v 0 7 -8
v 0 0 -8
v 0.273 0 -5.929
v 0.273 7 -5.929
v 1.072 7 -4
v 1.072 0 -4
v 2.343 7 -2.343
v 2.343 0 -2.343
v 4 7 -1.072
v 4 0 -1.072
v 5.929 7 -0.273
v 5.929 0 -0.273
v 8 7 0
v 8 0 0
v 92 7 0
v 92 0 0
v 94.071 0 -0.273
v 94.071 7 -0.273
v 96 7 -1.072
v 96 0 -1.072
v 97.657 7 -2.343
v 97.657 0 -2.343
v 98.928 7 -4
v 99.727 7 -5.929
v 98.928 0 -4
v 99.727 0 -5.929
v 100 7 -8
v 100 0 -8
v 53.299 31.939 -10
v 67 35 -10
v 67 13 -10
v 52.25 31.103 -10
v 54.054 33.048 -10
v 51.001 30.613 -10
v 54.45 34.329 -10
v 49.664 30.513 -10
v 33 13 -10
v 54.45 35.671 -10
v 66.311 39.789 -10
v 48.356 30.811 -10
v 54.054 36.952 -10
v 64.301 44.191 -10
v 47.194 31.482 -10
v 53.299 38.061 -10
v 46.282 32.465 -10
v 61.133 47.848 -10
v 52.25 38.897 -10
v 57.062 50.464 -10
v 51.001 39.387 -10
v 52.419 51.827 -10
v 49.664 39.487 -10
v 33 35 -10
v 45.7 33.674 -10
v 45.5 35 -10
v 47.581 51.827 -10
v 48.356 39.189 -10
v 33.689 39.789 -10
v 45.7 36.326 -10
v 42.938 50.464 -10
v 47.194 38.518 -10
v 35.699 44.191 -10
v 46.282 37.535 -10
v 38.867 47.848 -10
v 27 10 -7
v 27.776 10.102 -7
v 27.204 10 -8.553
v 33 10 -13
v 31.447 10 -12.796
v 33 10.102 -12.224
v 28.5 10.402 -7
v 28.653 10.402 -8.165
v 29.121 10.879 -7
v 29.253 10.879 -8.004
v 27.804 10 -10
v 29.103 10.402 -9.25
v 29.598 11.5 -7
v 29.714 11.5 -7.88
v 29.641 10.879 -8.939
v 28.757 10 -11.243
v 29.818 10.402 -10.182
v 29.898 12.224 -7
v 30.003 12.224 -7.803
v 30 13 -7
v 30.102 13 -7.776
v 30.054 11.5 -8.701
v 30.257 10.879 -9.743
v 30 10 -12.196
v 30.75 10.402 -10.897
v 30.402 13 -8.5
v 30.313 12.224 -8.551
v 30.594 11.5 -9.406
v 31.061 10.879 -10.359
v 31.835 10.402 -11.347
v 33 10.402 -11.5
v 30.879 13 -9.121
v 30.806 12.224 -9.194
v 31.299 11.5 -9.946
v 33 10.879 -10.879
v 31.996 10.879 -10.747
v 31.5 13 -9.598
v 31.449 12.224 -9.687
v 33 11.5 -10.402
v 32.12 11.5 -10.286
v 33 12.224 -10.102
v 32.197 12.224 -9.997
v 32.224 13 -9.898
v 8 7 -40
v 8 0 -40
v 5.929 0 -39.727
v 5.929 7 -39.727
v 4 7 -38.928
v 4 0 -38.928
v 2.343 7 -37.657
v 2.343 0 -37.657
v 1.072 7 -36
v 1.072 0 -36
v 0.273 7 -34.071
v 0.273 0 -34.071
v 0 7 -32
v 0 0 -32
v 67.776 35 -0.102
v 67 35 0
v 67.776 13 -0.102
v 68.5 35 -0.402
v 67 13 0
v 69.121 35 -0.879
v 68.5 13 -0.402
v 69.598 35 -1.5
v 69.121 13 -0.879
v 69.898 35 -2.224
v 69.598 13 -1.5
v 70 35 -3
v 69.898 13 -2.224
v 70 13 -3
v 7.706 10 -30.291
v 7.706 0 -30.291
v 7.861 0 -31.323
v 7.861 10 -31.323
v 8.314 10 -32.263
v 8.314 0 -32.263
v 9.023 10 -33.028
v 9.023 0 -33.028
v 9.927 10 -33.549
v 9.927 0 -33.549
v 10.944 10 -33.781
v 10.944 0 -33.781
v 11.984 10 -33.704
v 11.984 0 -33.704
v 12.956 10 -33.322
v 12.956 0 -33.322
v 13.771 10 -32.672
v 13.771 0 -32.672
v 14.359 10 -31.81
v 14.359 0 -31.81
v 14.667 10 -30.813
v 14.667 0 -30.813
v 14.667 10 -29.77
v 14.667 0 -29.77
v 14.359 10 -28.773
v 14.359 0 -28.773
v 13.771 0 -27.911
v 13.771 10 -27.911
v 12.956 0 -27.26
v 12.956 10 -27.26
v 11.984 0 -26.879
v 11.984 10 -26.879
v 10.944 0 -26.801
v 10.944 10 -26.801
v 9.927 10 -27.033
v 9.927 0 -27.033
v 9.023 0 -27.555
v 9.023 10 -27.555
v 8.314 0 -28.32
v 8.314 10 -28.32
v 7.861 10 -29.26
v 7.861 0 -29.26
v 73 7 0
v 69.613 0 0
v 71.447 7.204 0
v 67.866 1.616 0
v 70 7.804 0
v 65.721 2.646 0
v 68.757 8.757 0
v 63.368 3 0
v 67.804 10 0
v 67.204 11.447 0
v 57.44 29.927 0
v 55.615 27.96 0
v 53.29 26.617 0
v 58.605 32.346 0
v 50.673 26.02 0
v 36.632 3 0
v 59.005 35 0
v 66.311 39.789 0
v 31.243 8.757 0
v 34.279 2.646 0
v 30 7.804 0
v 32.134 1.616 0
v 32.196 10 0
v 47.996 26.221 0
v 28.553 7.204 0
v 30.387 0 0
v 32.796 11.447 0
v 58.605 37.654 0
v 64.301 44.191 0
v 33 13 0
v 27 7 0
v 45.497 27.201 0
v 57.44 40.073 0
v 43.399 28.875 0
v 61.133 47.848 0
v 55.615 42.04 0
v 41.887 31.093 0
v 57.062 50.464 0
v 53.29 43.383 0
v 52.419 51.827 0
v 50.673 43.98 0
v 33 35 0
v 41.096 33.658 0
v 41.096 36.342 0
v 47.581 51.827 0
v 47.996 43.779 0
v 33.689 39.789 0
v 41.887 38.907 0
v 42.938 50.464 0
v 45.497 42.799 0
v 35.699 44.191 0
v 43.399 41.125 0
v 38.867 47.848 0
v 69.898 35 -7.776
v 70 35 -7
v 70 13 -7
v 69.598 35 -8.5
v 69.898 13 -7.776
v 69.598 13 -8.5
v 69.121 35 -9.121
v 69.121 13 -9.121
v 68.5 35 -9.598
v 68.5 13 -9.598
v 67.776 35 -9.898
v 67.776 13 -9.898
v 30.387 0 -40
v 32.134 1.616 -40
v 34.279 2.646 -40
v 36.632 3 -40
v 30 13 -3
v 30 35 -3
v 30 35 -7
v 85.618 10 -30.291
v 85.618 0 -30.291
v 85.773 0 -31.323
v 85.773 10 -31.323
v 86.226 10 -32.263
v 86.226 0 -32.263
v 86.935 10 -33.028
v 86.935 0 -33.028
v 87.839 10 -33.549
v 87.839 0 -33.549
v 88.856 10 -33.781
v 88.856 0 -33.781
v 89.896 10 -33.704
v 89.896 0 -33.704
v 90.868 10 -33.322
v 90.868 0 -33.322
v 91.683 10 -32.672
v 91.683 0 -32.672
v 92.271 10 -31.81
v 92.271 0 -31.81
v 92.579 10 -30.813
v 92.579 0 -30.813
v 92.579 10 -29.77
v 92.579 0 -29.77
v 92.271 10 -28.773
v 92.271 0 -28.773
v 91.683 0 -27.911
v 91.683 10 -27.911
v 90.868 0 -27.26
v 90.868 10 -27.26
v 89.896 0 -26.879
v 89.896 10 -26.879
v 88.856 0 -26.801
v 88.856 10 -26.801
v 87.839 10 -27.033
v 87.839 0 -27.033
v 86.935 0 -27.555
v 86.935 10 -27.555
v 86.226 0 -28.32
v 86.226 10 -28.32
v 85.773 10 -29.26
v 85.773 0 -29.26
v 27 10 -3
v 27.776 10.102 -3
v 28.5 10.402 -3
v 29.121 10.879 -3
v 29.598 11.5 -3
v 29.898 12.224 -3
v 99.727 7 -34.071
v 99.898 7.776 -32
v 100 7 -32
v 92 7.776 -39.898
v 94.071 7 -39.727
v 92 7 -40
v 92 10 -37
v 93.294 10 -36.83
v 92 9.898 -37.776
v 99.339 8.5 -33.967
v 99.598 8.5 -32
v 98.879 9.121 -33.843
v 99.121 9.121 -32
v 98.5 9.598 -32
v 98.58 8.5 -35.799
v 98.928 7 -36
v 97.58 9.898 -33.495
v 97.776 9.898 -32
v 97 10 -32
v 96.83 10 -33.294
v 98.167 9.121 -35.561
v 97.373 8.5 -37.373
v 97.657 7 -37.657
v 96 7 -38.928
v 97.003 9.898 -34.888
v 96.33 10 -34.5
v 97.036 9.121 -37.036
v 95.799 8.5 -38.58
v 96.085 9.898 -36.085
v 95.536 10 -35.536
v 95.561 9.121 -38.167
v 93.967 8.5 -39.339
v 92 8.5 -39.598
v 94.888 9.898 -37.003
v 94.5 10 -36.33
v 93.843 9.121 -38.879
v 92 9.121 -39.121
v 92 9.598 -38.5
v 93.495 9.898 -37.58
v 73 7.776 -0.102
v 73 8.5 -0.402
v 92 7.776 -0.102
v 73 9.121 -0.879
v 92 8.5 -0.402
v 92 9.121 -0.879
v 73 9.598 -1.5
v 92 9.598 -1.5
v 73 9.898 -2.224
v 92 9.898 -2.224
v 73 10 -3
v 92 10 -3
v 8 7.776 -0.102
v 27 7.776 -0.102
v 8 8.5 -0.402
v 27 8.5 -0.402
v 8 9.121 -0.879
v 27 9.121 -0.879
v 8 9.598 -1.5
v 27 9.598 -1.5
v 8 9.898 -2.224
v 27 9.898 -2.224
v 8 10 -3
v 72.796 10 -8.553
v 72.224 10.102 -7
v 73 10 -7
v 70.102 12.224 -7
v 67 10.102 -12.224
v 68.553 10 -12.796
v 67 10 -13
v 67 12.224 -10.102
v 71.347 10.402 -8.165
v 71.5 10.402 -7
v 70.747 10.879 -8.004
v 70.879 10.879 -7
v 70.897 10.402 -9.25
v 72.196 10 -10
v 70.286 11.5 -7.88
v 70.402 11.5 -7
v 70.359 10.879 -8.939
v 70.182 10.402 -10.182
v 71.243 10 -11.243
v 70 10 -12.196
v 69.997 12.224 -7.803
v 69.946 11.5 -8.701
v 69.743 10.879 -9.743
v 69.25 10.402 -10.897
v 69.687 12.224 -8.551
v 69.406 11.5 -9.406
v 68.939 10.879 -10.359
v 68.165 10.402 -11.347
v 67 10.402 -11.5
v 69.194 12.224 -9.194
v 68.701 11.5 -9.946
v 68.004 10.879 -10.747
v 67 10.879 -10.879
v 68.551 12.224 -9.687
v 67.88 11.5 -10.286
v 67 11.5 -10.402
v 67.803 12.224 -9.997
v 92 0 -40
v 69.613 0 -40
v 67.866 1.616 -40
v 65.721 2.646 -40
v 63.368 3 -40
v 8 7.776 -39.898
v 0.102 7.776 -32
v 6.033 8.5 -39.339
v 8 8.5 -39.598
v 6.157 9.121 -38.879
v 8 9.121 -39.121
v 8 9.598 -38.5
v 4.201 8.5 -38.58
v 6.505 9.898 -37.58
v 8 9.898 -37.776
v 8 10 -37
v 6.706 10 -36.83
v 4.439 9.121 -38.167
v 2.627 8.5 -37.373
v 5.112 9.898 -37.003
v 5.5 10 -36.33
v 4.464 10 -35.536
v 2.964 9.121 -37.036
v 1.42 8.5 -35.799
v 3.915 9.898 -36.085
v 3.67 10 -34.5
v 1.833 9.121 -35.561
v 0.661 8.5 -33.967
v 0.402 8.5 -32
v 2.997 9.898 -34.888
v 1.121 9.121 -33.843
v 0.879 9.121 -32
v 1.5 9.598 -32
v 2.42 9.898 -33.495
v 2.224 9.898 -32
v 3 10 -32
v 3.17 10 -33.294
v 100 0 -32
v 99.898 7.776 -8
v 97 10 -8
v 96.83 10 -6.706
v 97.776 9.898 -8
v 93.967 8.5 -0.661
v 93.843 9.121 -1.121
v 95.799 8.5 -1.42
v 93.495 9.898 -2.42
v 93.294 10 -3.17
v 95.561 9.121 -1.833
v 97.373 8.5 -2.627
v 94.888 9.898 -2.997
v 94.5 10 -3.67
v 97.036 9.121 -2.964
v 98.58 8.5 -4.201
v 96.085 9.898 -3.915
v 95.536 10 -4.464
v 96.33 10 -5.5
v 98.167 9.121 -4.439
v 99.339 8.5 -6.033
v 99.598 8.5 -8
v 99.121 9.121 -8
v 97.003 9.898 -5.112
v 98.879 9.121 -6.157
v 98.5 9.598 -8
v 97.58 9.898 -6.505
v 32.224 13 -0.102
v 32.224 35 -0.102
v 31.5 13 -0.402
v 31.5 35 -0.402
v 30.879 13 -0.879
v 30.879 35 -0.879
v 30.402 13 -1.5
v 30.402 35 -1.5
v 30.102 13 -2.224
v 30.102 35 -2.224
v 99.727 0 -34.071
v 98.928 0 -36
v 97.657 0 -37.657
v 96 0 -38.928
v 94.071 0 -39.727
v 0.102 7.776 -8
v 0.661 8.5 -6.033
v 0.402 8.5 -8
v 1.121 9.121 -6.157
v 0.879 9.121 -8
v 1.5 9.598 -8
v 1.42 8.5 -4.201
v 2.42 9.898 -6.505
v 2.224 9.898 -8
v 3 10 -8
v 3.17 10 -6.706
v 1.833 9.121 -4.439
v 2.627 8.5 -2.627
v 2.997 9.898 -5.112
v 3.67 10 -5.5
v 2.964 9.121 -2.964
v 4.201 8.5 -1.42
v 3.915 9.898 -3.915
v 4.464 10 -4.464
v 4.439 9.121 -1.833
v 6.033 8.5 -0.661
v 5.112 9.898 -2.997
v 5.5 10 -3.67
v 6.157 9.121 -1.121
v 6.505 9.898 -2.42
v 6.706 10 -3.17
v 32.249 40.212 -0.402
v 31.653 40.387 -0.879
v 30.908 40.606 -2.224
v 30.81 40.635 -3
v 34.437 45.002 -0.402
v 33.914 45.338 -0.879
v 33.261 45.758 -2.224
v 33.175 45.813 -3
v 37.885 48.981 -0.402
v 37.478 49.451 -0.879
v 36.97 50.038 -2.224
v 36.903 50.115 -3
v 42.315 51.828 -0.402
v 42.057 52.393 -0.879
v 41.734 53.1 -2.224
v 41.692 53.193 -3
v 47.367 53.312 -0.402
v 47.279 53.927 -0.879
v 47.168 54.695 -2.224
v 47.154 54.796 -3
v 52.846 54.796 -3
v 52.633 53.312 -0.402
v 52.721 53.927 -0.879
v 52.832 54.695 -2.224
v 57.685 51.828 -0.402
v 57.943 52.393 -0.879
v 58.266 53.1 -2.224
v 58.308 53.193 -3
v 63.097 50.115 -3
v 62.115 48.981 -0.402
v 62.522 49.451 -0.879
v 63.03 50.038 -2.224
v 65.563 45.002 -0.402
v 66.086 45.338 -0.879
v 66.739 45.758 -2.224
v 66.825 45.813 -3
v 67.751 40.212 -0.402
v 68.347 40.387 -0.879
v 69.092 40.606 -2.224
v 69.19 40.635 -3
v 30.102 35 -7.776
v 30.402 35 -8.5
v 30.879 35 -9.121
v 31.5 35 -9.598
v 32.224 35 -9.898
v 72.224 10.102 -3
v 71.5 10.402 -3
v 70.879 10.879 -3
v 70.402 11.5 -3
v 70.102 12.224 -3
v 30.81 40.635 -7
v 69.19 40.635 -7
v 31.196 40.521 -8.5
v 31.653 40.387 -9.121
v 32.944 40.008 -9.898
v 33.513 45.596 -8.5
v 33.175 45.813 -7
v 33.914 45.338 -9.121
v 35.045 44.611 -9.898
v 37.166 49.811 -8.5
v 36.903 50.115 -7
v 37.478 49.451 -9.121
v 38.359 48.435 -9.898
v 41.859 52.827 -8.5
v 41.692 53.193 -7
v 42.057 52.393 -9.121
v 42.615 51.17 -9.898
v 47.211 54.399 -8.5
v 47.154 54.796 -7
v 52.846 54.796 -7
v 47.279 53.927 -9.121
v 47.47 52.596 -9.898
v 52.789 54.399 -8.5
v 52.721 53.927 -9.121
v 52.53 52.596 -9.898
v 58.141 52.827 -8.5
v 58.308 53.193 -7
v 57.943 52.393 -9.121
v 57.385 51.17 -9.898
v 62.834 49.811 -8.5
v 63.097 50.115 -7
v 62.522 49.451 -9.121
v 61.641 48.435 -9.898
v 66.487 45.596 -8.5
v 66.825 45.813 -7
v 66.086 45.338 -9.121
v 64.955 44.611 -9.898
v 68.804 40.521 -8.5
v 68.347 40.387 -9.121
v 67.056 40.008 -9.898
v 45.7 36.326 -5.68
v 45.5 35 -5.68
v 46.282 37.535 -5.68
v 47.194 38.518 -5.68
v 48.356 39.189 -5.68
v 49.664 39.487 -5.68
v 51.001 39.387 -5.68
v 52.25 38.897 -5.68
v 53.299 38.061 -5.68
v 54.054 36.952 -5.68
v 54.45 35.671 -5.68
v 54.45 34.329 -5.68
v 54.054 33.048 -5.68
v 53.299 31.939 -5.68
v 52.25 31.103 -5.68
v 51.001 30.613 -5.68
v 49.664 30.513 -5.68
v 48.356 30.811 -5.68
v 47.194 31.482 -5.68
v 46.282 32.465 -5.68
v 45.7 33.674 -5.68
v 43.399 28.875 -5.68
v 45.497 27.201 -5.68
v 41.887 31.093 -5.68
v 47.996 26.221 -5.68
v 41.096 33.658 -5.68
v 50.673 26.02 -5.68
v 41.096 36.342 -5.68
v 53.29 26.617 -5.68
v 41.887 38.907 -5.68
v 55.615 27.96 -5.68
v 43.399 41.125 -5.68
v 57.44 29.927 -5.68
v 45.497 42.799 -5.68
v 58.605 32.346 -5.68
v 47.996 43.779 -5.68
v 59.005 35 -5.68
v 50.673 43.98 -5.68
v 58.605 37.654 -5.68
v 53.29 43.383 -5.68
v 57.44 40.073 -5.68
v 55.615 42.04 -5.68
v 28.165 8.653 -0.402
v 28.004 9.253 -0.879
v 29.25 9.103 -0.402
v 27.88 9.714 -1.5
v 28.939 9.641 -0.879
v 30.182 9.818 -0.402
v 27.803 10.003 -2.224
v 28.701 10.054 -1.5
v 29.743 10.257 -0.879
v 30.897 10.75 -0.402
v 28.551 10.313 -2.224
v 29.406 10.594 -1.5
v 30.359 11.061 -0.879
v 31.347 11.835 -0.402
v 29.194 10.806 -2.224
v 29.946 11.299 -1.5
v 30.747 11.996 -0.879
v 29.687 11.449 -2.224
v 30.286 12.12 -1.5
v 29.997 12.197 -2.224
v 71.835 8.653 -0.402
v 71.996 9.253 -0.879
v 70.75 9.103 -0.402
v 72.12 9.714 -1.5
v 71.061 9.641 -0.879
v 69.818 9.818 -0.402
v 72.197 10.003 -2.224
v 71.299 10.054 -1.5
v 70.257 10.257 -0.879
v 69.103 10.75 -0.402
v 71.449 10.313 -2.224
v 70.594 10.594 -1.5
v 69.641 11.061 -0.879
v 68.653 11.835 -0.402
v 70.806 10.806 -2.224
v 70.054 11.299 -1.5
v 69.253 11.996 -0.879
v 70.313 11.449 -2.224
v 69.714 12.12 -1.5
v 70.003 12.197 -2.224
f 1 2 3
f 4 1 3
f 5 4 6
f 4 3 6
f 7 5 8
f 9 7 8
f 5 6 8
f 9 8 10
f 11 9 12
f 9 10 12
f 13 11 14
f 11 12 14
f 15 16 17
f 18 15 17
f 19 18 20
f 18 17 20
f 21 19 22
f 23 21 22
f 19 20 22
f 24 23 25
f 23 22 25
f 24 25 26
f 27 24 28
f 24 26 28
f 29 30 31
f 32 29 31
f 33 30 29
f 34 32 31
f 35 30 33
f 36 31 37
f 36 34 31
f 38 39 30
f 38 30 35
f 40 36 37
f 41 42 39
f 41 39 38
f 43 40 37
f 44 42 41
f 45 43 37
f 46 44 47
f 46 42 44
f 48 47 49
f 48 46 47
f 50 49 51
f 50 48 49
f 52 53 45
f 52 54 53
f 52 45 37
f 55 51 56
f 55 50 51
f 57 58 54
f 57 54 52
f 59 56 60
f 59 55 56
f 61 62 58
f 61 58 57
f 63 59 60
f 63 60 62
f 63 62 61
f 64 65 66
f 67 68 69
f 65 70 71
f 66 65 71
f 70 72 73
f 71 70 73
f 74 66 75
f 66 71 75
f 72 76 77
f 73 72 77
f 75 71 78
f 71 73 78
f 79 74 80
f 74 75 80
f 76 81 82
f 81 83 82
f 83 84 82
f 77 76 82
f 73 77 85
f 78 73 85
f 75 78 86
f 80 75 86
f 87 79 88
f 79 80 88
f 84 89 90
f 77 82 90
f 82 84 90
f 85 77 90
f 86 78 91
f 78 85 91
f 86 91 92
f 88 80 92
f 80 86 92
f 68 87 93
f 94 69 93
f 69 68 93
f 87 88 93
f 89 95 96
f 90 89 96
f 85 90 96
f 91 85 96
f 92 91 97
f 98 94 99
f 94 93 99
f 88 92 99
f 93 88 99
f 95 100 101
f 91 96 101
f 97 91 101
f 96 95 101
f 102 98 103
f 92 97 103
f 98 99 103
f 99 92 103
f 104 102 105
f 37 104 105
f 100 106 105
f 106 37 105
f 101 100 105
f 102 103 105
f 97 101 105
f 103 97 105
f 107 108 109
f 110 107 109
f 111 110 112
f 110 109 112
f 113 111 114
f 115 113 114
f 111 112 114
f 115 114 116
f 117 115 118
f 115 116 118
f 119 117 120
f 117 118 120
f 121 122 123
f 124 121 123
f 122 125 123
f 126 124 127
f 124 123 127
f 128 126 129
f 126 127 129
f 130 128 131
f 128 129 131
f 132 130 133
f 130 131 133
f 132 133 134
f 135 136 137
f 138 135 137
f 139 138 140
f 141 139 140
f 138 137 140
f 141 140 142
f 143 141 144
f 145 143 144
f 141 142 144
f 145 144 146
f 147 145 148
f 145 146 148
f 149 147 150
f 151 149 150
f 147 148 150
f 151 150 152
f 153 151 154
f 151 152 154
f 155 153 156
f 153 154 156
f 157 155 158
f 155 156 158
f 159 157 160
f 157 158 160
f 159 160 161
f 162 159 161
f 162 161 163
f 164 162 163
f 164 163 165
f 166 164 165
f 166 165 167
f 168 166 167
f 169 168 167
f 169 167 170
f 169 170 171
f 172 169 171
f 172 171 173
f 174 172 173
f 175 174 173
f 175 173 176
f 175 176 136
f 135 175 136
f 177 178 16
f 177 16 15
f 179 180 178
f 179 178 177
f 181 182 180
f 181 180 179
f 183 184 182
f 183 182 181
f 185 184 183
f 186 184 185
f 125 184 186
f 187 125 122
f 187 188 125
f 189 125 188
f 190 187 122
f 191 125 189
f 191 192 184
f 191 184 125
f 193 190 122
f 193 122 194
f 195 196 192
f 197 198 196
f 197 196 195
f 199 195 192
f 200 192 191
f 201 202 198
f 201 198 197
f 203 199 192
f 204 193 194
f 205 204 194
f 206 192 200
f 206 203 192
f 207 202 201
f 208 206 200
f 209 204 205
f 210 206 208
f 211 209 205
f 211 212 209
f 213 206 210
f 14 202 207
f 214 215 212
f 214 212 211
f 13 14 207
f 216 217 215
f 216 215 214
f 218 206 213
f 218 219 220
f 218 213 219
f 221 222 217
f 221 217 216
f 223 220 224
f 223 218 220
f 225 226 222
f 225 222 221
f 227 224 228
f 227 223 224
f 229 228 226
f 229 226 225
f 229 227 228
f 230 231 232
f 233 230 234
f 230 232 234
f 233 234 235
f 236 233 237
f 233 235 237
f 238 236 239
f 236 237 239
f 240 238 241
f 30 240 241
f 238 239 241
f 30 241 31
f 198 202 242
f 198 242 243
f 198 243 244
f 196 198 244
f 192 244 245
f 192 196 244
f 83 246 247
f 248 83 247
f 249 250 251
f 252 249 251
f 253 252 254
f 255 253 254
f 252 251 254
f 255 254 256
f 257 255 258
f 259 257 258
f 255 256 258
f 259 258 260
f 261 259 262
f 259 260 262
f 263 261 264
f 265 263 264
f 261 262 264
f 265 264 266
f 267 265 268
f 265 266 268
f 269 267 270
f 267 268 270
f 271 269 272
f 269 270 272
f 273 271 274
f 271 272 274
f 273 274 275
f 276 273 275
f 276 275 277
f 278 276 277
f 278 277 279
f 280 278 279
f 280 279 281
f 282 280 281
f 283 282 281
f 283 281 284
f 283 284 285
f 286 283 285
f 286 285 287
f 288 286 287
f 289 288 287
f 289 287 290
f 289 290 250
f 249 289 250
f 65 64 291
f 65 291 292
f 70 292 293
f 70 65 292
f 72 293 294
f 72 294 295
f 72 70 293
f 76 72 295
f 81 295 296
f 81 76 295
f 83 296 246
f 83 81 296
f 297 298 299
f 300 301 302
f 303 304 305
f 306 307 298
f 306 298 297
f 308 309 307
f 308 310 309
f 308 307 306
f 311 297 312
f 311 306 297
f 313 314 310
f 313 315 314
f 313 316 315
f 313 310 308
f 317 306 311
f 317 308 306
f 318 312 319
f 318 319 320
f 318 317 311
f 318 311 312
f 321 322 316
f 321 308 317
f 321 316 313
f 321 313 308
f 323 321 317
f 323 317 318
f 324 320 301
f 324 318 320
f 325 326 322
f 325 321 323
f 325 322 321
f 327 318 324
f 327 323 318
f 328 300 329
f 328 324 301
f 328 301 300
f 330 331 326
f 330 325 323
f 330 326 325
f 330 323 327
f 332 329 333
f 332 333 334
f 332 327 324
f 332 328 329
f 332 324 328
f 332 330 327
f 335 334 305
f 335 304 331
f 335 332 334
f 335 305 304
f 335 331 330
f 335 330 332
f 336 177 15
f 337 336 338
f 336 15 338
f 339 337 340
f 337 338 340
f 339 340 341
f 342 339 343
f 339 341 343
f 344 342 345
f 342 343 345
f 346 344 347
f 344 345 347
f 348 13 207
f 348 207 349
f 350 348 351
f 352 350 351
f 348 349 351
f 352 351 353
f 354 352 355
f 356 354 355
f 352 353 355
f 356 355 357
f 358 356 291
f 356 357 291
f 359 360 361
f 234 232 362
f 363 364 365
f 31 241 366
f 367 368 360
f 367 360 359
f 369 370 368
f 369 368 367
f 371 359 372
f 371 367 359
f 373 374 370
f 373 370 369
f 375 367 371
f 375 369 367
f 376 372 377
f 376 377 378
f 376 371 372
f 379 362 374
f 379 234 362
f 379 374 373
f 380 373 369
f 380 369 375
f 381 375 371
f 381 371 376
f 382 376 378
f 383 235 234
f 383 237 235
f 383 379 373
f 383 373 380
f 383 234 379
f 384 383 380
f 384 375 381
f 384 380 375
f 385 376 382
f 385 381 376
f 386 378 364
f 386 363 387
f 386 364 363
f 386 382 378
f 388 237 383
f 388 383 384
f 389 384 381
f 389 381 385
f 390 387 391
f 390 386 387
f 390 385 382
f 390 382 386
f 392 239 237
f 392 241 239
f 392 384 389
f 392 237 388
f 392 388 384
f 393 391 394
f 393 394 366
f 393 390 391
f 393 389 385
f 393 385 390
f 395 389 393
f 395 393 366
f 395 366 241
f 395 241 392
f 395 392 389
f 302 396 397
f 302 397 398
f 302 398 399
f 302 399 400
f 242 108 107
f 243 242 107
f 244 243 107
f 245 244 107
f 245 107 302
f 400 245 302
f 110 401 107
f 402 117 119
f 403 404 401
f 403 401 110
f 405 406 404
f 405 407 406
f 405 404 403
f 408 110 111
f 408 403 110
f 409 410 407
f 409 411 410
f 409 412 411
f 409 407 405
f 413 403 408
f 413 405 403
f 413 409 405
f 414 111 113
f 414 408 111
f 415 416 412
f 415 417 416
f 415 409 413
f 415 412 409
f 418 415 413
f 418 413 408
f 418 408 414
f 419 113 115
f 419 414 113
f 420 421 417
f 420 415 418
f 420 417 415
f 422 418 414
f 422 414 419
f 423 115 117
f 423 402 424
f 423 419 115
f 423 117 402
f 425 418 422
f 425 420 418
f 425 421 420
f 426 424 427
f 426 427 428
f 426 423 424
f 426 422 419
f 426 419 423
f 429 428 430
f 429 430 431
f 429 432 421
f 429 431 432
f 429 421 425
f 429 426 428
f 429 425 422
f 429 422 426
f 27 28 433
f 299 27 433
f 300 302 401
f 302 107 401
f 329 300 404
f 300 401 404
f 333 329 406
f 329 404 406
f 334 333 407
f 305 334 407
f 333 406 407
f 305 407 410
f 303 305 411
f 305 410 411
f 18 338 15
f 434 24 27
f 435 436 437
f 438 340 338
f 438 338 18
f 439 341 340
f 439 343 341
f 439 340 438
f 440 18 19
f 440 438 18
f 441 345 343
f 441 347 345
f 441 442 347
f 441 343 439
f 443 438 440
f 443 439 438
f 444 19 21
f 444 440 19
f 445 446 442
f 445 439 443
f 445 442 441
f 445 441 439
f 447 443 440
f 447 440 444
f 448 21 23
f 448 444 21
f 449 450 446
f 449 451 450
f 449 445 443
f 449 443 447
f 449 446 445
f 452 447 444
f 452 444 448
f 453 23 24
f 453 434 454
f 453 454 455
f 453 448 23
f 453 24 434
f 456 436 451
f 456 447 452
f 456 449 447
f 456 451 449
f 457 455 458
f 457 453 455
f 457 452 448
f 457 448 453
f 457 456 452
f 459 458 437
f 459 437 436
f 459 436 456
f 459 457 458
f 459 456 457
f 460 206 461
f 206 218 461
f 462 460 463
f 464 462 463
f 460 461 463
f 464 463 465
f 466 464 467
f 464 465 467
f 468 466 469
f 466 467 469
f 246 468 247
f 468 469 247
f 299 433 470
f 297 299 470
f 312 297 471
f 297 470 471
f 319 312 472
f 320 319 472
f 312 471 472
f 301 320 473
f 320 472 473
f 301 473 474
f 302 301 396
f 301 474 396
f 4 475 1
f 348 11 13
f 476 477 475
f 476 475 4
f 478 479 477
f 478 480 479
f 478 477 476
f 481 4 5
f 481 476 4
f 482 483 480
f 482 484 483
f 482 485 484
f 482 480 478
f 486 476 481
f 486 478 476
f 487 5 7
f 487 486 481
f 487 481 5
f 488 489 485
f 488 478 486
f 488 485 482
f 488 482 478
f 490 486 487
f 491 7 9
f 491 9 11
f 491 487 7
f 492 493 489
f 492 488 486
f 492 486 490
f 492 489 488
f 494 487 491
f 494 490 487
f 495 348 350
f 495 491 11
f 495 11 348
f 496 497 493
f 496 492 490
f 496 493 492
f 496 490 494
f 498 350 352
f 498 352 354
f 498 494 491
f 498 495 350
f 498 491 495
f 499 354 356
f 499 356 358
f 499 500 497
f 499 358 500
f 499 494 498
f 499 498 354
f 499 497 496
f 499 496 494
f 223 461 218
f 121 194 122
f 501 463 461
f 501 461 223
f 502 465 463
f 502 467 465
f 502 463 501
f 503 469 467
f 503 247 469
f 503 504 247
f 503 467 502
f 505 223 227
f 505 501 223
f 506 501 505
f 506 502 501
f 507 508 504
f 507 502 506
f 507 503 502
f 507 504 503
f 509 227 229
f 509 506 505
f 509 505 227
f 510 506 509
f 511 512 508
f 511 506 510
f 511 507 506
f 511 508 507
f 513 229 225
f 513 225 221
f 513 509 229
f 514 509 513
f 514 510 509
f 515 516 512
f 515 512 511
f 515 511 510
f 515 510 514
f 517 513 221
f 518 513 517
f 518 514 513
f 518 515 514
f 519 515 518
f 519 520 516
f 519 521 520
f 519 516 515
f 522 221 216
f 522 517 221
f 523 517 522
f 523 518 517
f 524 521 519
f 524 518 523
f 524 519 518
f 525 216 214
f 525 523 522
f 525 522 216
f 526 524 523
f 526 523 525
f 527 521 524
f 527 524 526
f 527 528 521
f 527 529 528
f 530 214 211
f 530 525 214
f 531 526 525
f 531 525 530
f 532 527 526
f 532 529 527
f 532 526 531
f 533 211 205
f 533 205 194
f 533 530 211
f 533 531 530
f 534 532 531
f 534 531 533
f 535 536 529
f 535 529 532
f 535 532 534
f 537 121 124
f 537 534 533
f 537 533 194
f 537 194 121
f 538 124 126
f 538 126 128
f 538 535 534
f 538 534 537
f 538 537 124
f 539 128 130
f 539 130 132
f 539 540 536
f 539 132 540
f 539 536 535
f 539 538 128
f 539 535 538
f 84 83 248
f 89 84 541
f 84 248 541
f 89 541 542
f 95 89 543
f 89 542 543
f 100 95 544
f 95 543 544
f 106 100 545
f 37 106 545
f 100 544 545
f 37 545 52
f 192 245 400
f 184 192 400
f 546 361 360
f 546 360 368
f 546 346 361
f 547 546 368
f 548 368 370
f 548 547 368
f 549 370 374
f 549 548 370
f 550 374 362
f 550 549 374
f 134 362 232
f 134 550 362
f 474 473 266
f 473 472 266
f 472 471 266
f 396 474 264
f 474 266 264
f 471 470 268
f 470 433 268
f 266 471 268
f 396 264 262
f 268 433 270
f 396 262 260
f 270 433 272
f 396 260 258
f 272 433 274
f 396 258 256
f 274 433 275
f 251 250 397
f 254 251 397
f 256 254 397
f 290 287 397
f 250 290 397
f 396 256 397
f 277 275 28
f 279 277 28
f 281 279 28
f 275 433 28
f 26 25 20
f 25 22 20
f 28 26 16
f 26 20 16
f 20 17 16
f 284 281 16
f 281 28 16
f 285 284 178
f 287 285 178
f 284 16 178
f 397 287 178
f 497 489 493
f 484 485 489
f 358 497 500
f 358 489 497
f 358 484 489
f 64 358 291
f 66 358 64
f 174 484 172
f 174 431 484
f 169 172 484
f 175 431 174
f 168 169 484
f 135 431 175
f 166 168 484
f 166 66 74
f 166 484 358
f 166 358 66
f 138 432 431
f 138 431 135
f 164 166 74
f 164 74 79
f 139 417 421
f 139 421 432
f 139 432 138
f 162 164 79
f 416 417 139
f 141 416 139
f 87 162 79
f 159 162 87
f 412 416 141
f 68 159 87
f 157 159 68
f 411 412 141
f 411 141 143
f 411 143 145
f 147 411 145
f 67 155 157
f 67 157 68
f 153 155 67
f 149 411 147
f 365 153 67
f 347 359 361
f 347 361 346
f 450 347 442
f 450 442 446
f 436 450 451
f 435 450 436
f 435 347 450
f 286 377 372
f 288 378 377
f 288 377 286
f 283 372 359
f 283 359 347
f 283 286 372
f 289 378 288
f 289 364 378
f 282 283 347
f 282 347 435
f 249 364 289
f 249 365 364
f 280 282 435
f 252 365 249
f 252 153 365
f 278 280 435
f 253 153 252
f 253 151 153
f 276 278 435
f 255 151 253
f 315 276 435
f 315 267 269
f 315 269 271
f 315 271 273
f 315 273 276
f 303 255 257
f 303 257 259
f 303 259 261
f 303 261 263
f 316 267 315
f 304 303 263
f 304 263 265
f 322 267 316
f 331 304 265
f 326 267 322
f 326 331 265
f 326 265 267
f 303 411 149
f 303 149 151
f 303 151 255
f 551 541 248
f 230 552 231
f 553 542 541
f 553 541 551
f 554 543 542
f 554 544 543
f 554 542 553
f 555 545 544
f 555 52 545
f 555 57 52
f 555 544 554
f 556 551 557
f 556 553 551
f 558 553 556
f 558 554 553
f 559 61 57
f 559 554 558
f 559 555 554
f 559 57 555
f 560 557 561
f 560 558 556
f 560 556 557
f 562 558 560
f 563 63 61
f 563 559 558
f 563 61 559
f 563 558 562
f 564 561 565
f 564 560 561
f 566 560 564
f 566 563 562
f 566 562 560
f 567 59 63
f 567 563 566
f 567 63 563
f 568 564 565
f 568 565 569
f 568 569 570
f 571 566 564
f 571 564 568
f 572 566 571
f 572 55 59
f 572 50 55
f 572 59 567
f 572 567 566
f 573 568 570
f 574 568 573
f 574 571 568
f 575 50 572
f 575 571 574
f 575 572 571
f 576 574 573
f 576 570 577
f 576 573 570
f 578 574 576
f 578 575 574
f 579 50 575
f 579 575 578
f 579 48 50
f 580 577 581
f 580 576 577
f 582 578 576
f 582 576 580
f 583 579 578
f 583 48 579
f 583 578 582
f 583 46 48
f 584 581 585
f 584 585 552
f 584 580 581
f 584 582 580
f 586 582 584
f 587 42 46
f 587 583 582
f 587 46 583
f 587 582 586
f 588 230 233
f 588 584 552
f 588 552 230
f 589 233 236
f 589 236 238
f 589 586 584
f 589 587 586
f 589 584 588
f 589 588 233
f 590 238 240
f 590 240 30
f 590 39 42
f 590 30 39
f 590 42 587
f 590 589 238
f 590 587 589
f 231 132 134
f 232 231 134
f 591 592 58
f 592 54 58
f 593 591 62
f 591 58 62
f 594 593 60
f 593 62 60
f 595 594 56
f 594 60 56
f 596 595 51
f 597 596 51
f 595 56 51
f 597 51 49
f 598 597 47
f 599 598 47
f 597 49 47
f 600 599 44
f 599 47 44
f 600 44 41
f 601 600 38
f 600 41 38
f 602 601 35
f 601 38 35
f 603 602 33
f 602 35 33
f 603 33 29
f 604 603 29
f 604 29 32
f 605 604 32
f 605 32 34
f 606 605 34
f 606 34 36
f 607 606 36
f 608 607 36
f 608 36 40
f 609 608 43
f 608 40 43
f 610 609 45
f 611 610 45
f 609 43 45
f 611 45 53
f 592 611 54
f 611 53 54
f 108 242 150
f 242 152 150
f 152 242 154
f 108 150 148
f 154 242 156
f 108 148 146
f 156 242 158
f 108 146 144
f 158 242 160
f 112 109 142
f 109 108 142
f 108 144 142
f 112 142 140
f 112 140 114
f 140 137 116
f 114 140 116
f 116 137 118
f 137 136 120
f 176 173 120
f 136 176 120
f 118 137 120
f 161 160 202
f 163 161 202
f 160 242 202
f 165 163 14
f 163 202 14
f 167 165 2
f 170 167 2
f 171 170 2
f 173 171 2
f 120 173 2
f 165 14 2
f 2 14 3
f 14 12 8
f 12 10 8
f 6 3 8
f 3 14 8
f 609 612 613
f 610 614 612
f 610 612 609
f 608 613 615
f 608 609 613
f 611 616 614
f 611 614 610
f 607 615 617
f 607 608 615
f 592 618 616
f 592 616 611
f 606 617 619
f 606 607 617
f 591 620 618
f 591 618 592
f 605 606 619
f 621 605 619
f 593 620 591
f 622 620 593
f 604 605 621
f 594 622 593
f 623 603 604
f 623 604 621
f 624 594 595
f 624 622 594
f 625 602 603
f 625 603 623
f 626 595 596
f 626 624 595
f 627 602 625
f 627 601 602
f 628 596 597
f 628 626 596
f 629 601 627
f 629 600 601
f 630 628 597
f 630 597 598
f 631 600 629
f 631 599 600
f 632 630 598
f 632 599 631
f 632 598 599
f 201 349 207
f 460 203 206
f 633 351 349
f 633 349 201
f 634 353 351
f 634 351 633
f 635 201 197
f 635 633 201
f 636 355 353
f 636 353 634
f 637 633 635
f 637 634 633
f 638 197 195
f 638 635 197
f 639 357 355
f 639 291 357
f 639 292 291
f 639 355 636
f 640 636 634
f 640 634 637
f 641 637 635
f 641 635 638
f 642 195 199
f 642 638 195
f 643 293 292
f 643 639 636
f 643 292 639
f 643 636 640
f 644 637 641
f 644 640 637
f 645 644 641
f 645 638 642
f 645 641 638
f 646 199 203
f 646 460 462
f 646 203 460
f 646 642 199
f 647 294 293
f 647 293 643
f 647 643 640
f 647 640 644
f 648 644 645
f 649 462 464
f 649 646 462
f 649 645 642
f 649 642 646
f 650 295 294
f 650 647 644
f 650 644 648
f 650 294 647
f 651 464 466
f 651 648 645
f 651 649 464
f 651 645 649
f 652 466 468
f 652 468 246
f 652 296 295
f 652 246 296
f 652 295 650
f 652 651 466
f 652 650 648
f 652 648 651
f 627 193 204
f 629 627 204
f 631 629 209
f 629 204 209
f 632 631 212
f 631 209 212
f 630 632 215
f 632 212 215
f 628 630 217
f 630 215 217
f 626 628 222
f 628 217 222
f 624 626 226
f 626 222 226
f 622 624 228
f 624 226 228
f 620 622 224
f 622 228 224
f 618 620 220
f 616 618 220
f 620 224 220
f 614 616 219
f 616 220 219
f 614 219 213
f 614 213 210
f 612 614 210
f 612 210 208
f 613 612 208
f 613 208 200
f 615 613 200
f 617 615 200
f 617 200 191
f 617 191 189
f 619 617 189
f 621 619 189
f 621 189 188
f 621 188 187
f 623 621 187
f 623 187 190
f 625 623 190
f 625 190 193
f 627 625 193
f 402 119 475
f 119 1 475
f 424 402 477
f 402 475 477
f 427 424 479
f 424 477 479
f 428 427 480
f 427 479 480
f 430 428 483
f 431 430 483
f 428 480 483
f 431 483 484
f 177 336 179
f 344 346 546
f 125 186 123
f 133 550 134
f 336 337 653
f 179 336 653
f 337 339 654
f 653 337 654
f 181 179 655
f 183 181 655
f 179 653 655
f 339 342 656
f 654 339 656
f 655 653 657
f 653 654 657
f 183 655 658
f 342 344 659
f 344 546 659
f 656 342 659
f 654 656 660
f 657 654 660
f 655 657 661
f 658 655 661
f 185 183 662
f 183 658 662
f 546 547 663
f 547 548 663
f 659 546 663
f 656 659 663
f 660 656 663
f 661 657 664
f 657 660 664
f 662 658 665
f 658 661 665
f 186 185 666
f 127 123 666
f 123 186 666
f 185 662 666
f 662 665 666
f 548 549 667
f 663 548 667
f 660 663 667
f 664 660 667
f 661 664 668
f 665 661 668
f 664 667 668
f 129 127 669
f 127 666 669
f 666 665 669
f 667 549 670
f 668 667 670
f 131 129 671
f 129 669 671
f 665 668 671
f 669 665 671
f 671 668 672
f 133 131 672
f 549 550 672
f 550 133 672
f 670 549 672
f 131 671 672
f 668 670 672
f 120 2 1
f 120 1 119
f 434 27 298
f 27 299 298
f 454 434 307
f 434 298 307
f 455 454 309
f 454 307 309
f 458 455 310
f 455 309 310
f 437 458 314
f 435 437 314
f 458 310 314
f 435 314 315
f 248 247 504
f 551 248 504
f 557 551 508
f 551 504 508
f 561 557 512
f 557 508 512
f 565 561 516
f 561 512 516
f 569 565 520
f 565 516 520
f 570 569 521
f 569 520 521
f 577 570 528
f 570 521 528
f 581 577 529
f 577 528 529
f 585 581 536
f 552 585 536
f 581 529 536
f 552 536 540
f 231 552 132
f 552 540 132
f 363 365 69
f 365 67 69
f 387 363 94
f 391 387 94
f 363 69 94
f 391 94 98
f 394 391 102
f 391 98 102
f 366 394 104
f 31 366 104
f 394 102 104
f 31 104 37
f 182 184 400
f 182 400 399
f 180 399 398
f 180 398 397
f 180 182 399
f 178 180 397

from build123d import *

# Parameters (mm, degrees)
ESBO_O1_W                                            = 100
ESBO_O1_H                                            = 40
BASEPLATE_DEPTH                                      = 10
VERTBOSS_DEPTH                                       = 10
ESBO_O3_W                                            = 39.225392784
ESBO_O3_H                                            = 3
BOTTOMSLOT_DEPTH                                     = 121.933866224
REBAIXO_PARA_PARAFUSO_DE_CABE_A_SEXTAVAD_D           = 9
REBAIXO_PARA_PARAFUSO_DE_CABE_A_SEXTAVAD_CBORE_D     = 18.01
REBAIXO_PARA_PARAFUSO_DE_CABE_A_SEXTAVAD_CBORE_DEPTH = 5.68
FILETE1_R                                            = 8
FILETE2_R                                            = 3
FURO_DE_DI_METRO_7_0_7_2_D                           = 7


with BuildPart() as part:
    # Esboço1 → BasePlate (new body)
    with BuildSketch(Plane(origin=(0, 0, 0), x_dir=(1, 0, 0), z_dir=(0, 1, 0))):
        with Locations((50, 20)):
            Rectangle(ESBO_O1_W, ESBO_O1_H)
    extrude(amount=BASEPLATE_DEPTH)

    # Esboço2 → VertBoss (add)
    with BuildSketch(Plane.XY):
        with BuildLine():
            Line((30, 0), (30, 35))
            ThreePointArc((30, 35), (50, 55), (70, 35))
            Line((70, 35), (70, 0))
            Line((70, 0), (30, 0))
        make_face()
    extrude(amount=-VERTBOSS_DEPTH)

    # Esboço3 → BottomSlot (cut, through all)
    with BuildSketch(Plane.XY):
        with Locations((50, 1.5)):
            Rectangle(ESBO_O3_W, ESBO_O3_H)
    extrude(amount=-BOTTOMSLOT_DEPTH, mode=Mode.SUBTRACT)

    # Rebaixo para parafuso de cabeça sextavada de M81 (through all)
    with Locations(Plane.XY):
        with Locations((50, 35)):
            CounterBoreHole(REBAIXO_PARA_PARAFUSO_DE_CABE_A_SEXTAVAD_D / 2, REBAIXO_PARA_PARAFUSO_DE_CABE_A_SEXTAVAD_CBORE_D / 2, REBAIXO_PARA_PARAFUSO_DE_CABE_A_SEXTAVAD_CBORE_DEPTH)

    # Filete1
    # the kernel refuses this fillet: 8 mm, written as the material it adds along each edge
    with BuildSketch(Plane(origin=(69.612696392, 3, 0), x_dir=(-1, 0, 0), z_dir=(0, 0, -1))) as filete1_piece_1:
        with BuildLine():
            CenterArc((6.244997998, -8), FILETE1_R, 90, 51.317812547)
            Line((0, -3), (0, 0))
            Line((0, 0), (6.244997998, 0))
        make_face()
    extrude(amount=40)
    with BuildSketch(Plane(origin=(30.387303608, 3, 0), x_dir=(0, -1, 0), z_dir=(0, 0, -1))) as filete1_piece_2:
        with BuildLine():
            CenterArc((8, -6.244997998), FILETE1_R, 128.682187453, 51.317812547)
            Line((0, -6.244997998), (0, 0))
            Line((0, 0), (3, 0))
        make_face()
    extrude(amount=40)
    # the kernel refuses this fillet: 8 mm, written as the material it takes off along each edge
    with BuildSketch(Plane(origin=(0, -20, -40), x_dir=(0, 0, 1), z_dir=(0, 1, 0)), Plane(origin=(0, -20, 0), x_dir=(1, 0, 0), z_dir=(0, 1, 0))) as filete1_2_piece_1:
        with BuildLine():
            CenterArc((FILETE1_R, FILETE1_R), FILETE1_R, 180, 90)
            Line((0, FILETE1_R), (0, 0))
            Line((0, 0), (FILETE1_R, 0))
        make_face()
    extrude(amount=50, mode=Mode.SUBTRACT)
    with BuildSketch(Plane(origin=(100, -20, 0), x_dir=(-1, 0, 0), z_dir=(0, 1, 0)), Plane(origin=(100, -20, -40), x_dir=(0, 0, 1), z_dir=(0, 1, 0))) as filete1_2_piece_2:
        with BuildLine():
            CenterArc((FILETE1_R, -FILETE1_R), FILETE1_R, 90, 90)
            Line((0, -FILETE1_R), (0, 0))
            Line((0, 0), (FILETE1_R, 0))
        make_face()
    extrude(amount=50, mode=Mode.SUBTRACT)

    # Filete2
    filete2_edges = [part.edges().sort_by_distance(p)[0] for p in [
        (81, 10, 0),
        (30, 22.5, -10),
        (70, 22.5, -10),
        (30, 22.5, 0),
        (70, 22.5, 0),
        (50, 55, 0),
        (30, 10, -5),
        (50, 55, -10),
        (70, 10, -5),
        (50, 10, -10),
        (0, 10, -20),
        (50, 10, -40),
        (19, 10, 0),
        (100, 10, -20),
        (2.343145751, 10, -2.343145751),
        (97.656854249, 10, -37.656854249),
        (97.656854249, 10, -2.343145751),
        (2.343145751, 10, -37.656854249),
    ]]
    fillet(filete2_edges, radius=FILETE2_R)

    # Furo de diâmetro Ø7.0 (7)2 (through all)
    with Locations(Plane(origin=(0, 10, 0), x_dir=(1, 0, 0), z_dir=(0, 1, 0))):
        with Locations((11.205655488, 30.291277502), (89.117630716, 30.291277502)):
            Hole(FURO_DE_DI_METRO_7_0_7_2_D / 2)


solid = part.part
